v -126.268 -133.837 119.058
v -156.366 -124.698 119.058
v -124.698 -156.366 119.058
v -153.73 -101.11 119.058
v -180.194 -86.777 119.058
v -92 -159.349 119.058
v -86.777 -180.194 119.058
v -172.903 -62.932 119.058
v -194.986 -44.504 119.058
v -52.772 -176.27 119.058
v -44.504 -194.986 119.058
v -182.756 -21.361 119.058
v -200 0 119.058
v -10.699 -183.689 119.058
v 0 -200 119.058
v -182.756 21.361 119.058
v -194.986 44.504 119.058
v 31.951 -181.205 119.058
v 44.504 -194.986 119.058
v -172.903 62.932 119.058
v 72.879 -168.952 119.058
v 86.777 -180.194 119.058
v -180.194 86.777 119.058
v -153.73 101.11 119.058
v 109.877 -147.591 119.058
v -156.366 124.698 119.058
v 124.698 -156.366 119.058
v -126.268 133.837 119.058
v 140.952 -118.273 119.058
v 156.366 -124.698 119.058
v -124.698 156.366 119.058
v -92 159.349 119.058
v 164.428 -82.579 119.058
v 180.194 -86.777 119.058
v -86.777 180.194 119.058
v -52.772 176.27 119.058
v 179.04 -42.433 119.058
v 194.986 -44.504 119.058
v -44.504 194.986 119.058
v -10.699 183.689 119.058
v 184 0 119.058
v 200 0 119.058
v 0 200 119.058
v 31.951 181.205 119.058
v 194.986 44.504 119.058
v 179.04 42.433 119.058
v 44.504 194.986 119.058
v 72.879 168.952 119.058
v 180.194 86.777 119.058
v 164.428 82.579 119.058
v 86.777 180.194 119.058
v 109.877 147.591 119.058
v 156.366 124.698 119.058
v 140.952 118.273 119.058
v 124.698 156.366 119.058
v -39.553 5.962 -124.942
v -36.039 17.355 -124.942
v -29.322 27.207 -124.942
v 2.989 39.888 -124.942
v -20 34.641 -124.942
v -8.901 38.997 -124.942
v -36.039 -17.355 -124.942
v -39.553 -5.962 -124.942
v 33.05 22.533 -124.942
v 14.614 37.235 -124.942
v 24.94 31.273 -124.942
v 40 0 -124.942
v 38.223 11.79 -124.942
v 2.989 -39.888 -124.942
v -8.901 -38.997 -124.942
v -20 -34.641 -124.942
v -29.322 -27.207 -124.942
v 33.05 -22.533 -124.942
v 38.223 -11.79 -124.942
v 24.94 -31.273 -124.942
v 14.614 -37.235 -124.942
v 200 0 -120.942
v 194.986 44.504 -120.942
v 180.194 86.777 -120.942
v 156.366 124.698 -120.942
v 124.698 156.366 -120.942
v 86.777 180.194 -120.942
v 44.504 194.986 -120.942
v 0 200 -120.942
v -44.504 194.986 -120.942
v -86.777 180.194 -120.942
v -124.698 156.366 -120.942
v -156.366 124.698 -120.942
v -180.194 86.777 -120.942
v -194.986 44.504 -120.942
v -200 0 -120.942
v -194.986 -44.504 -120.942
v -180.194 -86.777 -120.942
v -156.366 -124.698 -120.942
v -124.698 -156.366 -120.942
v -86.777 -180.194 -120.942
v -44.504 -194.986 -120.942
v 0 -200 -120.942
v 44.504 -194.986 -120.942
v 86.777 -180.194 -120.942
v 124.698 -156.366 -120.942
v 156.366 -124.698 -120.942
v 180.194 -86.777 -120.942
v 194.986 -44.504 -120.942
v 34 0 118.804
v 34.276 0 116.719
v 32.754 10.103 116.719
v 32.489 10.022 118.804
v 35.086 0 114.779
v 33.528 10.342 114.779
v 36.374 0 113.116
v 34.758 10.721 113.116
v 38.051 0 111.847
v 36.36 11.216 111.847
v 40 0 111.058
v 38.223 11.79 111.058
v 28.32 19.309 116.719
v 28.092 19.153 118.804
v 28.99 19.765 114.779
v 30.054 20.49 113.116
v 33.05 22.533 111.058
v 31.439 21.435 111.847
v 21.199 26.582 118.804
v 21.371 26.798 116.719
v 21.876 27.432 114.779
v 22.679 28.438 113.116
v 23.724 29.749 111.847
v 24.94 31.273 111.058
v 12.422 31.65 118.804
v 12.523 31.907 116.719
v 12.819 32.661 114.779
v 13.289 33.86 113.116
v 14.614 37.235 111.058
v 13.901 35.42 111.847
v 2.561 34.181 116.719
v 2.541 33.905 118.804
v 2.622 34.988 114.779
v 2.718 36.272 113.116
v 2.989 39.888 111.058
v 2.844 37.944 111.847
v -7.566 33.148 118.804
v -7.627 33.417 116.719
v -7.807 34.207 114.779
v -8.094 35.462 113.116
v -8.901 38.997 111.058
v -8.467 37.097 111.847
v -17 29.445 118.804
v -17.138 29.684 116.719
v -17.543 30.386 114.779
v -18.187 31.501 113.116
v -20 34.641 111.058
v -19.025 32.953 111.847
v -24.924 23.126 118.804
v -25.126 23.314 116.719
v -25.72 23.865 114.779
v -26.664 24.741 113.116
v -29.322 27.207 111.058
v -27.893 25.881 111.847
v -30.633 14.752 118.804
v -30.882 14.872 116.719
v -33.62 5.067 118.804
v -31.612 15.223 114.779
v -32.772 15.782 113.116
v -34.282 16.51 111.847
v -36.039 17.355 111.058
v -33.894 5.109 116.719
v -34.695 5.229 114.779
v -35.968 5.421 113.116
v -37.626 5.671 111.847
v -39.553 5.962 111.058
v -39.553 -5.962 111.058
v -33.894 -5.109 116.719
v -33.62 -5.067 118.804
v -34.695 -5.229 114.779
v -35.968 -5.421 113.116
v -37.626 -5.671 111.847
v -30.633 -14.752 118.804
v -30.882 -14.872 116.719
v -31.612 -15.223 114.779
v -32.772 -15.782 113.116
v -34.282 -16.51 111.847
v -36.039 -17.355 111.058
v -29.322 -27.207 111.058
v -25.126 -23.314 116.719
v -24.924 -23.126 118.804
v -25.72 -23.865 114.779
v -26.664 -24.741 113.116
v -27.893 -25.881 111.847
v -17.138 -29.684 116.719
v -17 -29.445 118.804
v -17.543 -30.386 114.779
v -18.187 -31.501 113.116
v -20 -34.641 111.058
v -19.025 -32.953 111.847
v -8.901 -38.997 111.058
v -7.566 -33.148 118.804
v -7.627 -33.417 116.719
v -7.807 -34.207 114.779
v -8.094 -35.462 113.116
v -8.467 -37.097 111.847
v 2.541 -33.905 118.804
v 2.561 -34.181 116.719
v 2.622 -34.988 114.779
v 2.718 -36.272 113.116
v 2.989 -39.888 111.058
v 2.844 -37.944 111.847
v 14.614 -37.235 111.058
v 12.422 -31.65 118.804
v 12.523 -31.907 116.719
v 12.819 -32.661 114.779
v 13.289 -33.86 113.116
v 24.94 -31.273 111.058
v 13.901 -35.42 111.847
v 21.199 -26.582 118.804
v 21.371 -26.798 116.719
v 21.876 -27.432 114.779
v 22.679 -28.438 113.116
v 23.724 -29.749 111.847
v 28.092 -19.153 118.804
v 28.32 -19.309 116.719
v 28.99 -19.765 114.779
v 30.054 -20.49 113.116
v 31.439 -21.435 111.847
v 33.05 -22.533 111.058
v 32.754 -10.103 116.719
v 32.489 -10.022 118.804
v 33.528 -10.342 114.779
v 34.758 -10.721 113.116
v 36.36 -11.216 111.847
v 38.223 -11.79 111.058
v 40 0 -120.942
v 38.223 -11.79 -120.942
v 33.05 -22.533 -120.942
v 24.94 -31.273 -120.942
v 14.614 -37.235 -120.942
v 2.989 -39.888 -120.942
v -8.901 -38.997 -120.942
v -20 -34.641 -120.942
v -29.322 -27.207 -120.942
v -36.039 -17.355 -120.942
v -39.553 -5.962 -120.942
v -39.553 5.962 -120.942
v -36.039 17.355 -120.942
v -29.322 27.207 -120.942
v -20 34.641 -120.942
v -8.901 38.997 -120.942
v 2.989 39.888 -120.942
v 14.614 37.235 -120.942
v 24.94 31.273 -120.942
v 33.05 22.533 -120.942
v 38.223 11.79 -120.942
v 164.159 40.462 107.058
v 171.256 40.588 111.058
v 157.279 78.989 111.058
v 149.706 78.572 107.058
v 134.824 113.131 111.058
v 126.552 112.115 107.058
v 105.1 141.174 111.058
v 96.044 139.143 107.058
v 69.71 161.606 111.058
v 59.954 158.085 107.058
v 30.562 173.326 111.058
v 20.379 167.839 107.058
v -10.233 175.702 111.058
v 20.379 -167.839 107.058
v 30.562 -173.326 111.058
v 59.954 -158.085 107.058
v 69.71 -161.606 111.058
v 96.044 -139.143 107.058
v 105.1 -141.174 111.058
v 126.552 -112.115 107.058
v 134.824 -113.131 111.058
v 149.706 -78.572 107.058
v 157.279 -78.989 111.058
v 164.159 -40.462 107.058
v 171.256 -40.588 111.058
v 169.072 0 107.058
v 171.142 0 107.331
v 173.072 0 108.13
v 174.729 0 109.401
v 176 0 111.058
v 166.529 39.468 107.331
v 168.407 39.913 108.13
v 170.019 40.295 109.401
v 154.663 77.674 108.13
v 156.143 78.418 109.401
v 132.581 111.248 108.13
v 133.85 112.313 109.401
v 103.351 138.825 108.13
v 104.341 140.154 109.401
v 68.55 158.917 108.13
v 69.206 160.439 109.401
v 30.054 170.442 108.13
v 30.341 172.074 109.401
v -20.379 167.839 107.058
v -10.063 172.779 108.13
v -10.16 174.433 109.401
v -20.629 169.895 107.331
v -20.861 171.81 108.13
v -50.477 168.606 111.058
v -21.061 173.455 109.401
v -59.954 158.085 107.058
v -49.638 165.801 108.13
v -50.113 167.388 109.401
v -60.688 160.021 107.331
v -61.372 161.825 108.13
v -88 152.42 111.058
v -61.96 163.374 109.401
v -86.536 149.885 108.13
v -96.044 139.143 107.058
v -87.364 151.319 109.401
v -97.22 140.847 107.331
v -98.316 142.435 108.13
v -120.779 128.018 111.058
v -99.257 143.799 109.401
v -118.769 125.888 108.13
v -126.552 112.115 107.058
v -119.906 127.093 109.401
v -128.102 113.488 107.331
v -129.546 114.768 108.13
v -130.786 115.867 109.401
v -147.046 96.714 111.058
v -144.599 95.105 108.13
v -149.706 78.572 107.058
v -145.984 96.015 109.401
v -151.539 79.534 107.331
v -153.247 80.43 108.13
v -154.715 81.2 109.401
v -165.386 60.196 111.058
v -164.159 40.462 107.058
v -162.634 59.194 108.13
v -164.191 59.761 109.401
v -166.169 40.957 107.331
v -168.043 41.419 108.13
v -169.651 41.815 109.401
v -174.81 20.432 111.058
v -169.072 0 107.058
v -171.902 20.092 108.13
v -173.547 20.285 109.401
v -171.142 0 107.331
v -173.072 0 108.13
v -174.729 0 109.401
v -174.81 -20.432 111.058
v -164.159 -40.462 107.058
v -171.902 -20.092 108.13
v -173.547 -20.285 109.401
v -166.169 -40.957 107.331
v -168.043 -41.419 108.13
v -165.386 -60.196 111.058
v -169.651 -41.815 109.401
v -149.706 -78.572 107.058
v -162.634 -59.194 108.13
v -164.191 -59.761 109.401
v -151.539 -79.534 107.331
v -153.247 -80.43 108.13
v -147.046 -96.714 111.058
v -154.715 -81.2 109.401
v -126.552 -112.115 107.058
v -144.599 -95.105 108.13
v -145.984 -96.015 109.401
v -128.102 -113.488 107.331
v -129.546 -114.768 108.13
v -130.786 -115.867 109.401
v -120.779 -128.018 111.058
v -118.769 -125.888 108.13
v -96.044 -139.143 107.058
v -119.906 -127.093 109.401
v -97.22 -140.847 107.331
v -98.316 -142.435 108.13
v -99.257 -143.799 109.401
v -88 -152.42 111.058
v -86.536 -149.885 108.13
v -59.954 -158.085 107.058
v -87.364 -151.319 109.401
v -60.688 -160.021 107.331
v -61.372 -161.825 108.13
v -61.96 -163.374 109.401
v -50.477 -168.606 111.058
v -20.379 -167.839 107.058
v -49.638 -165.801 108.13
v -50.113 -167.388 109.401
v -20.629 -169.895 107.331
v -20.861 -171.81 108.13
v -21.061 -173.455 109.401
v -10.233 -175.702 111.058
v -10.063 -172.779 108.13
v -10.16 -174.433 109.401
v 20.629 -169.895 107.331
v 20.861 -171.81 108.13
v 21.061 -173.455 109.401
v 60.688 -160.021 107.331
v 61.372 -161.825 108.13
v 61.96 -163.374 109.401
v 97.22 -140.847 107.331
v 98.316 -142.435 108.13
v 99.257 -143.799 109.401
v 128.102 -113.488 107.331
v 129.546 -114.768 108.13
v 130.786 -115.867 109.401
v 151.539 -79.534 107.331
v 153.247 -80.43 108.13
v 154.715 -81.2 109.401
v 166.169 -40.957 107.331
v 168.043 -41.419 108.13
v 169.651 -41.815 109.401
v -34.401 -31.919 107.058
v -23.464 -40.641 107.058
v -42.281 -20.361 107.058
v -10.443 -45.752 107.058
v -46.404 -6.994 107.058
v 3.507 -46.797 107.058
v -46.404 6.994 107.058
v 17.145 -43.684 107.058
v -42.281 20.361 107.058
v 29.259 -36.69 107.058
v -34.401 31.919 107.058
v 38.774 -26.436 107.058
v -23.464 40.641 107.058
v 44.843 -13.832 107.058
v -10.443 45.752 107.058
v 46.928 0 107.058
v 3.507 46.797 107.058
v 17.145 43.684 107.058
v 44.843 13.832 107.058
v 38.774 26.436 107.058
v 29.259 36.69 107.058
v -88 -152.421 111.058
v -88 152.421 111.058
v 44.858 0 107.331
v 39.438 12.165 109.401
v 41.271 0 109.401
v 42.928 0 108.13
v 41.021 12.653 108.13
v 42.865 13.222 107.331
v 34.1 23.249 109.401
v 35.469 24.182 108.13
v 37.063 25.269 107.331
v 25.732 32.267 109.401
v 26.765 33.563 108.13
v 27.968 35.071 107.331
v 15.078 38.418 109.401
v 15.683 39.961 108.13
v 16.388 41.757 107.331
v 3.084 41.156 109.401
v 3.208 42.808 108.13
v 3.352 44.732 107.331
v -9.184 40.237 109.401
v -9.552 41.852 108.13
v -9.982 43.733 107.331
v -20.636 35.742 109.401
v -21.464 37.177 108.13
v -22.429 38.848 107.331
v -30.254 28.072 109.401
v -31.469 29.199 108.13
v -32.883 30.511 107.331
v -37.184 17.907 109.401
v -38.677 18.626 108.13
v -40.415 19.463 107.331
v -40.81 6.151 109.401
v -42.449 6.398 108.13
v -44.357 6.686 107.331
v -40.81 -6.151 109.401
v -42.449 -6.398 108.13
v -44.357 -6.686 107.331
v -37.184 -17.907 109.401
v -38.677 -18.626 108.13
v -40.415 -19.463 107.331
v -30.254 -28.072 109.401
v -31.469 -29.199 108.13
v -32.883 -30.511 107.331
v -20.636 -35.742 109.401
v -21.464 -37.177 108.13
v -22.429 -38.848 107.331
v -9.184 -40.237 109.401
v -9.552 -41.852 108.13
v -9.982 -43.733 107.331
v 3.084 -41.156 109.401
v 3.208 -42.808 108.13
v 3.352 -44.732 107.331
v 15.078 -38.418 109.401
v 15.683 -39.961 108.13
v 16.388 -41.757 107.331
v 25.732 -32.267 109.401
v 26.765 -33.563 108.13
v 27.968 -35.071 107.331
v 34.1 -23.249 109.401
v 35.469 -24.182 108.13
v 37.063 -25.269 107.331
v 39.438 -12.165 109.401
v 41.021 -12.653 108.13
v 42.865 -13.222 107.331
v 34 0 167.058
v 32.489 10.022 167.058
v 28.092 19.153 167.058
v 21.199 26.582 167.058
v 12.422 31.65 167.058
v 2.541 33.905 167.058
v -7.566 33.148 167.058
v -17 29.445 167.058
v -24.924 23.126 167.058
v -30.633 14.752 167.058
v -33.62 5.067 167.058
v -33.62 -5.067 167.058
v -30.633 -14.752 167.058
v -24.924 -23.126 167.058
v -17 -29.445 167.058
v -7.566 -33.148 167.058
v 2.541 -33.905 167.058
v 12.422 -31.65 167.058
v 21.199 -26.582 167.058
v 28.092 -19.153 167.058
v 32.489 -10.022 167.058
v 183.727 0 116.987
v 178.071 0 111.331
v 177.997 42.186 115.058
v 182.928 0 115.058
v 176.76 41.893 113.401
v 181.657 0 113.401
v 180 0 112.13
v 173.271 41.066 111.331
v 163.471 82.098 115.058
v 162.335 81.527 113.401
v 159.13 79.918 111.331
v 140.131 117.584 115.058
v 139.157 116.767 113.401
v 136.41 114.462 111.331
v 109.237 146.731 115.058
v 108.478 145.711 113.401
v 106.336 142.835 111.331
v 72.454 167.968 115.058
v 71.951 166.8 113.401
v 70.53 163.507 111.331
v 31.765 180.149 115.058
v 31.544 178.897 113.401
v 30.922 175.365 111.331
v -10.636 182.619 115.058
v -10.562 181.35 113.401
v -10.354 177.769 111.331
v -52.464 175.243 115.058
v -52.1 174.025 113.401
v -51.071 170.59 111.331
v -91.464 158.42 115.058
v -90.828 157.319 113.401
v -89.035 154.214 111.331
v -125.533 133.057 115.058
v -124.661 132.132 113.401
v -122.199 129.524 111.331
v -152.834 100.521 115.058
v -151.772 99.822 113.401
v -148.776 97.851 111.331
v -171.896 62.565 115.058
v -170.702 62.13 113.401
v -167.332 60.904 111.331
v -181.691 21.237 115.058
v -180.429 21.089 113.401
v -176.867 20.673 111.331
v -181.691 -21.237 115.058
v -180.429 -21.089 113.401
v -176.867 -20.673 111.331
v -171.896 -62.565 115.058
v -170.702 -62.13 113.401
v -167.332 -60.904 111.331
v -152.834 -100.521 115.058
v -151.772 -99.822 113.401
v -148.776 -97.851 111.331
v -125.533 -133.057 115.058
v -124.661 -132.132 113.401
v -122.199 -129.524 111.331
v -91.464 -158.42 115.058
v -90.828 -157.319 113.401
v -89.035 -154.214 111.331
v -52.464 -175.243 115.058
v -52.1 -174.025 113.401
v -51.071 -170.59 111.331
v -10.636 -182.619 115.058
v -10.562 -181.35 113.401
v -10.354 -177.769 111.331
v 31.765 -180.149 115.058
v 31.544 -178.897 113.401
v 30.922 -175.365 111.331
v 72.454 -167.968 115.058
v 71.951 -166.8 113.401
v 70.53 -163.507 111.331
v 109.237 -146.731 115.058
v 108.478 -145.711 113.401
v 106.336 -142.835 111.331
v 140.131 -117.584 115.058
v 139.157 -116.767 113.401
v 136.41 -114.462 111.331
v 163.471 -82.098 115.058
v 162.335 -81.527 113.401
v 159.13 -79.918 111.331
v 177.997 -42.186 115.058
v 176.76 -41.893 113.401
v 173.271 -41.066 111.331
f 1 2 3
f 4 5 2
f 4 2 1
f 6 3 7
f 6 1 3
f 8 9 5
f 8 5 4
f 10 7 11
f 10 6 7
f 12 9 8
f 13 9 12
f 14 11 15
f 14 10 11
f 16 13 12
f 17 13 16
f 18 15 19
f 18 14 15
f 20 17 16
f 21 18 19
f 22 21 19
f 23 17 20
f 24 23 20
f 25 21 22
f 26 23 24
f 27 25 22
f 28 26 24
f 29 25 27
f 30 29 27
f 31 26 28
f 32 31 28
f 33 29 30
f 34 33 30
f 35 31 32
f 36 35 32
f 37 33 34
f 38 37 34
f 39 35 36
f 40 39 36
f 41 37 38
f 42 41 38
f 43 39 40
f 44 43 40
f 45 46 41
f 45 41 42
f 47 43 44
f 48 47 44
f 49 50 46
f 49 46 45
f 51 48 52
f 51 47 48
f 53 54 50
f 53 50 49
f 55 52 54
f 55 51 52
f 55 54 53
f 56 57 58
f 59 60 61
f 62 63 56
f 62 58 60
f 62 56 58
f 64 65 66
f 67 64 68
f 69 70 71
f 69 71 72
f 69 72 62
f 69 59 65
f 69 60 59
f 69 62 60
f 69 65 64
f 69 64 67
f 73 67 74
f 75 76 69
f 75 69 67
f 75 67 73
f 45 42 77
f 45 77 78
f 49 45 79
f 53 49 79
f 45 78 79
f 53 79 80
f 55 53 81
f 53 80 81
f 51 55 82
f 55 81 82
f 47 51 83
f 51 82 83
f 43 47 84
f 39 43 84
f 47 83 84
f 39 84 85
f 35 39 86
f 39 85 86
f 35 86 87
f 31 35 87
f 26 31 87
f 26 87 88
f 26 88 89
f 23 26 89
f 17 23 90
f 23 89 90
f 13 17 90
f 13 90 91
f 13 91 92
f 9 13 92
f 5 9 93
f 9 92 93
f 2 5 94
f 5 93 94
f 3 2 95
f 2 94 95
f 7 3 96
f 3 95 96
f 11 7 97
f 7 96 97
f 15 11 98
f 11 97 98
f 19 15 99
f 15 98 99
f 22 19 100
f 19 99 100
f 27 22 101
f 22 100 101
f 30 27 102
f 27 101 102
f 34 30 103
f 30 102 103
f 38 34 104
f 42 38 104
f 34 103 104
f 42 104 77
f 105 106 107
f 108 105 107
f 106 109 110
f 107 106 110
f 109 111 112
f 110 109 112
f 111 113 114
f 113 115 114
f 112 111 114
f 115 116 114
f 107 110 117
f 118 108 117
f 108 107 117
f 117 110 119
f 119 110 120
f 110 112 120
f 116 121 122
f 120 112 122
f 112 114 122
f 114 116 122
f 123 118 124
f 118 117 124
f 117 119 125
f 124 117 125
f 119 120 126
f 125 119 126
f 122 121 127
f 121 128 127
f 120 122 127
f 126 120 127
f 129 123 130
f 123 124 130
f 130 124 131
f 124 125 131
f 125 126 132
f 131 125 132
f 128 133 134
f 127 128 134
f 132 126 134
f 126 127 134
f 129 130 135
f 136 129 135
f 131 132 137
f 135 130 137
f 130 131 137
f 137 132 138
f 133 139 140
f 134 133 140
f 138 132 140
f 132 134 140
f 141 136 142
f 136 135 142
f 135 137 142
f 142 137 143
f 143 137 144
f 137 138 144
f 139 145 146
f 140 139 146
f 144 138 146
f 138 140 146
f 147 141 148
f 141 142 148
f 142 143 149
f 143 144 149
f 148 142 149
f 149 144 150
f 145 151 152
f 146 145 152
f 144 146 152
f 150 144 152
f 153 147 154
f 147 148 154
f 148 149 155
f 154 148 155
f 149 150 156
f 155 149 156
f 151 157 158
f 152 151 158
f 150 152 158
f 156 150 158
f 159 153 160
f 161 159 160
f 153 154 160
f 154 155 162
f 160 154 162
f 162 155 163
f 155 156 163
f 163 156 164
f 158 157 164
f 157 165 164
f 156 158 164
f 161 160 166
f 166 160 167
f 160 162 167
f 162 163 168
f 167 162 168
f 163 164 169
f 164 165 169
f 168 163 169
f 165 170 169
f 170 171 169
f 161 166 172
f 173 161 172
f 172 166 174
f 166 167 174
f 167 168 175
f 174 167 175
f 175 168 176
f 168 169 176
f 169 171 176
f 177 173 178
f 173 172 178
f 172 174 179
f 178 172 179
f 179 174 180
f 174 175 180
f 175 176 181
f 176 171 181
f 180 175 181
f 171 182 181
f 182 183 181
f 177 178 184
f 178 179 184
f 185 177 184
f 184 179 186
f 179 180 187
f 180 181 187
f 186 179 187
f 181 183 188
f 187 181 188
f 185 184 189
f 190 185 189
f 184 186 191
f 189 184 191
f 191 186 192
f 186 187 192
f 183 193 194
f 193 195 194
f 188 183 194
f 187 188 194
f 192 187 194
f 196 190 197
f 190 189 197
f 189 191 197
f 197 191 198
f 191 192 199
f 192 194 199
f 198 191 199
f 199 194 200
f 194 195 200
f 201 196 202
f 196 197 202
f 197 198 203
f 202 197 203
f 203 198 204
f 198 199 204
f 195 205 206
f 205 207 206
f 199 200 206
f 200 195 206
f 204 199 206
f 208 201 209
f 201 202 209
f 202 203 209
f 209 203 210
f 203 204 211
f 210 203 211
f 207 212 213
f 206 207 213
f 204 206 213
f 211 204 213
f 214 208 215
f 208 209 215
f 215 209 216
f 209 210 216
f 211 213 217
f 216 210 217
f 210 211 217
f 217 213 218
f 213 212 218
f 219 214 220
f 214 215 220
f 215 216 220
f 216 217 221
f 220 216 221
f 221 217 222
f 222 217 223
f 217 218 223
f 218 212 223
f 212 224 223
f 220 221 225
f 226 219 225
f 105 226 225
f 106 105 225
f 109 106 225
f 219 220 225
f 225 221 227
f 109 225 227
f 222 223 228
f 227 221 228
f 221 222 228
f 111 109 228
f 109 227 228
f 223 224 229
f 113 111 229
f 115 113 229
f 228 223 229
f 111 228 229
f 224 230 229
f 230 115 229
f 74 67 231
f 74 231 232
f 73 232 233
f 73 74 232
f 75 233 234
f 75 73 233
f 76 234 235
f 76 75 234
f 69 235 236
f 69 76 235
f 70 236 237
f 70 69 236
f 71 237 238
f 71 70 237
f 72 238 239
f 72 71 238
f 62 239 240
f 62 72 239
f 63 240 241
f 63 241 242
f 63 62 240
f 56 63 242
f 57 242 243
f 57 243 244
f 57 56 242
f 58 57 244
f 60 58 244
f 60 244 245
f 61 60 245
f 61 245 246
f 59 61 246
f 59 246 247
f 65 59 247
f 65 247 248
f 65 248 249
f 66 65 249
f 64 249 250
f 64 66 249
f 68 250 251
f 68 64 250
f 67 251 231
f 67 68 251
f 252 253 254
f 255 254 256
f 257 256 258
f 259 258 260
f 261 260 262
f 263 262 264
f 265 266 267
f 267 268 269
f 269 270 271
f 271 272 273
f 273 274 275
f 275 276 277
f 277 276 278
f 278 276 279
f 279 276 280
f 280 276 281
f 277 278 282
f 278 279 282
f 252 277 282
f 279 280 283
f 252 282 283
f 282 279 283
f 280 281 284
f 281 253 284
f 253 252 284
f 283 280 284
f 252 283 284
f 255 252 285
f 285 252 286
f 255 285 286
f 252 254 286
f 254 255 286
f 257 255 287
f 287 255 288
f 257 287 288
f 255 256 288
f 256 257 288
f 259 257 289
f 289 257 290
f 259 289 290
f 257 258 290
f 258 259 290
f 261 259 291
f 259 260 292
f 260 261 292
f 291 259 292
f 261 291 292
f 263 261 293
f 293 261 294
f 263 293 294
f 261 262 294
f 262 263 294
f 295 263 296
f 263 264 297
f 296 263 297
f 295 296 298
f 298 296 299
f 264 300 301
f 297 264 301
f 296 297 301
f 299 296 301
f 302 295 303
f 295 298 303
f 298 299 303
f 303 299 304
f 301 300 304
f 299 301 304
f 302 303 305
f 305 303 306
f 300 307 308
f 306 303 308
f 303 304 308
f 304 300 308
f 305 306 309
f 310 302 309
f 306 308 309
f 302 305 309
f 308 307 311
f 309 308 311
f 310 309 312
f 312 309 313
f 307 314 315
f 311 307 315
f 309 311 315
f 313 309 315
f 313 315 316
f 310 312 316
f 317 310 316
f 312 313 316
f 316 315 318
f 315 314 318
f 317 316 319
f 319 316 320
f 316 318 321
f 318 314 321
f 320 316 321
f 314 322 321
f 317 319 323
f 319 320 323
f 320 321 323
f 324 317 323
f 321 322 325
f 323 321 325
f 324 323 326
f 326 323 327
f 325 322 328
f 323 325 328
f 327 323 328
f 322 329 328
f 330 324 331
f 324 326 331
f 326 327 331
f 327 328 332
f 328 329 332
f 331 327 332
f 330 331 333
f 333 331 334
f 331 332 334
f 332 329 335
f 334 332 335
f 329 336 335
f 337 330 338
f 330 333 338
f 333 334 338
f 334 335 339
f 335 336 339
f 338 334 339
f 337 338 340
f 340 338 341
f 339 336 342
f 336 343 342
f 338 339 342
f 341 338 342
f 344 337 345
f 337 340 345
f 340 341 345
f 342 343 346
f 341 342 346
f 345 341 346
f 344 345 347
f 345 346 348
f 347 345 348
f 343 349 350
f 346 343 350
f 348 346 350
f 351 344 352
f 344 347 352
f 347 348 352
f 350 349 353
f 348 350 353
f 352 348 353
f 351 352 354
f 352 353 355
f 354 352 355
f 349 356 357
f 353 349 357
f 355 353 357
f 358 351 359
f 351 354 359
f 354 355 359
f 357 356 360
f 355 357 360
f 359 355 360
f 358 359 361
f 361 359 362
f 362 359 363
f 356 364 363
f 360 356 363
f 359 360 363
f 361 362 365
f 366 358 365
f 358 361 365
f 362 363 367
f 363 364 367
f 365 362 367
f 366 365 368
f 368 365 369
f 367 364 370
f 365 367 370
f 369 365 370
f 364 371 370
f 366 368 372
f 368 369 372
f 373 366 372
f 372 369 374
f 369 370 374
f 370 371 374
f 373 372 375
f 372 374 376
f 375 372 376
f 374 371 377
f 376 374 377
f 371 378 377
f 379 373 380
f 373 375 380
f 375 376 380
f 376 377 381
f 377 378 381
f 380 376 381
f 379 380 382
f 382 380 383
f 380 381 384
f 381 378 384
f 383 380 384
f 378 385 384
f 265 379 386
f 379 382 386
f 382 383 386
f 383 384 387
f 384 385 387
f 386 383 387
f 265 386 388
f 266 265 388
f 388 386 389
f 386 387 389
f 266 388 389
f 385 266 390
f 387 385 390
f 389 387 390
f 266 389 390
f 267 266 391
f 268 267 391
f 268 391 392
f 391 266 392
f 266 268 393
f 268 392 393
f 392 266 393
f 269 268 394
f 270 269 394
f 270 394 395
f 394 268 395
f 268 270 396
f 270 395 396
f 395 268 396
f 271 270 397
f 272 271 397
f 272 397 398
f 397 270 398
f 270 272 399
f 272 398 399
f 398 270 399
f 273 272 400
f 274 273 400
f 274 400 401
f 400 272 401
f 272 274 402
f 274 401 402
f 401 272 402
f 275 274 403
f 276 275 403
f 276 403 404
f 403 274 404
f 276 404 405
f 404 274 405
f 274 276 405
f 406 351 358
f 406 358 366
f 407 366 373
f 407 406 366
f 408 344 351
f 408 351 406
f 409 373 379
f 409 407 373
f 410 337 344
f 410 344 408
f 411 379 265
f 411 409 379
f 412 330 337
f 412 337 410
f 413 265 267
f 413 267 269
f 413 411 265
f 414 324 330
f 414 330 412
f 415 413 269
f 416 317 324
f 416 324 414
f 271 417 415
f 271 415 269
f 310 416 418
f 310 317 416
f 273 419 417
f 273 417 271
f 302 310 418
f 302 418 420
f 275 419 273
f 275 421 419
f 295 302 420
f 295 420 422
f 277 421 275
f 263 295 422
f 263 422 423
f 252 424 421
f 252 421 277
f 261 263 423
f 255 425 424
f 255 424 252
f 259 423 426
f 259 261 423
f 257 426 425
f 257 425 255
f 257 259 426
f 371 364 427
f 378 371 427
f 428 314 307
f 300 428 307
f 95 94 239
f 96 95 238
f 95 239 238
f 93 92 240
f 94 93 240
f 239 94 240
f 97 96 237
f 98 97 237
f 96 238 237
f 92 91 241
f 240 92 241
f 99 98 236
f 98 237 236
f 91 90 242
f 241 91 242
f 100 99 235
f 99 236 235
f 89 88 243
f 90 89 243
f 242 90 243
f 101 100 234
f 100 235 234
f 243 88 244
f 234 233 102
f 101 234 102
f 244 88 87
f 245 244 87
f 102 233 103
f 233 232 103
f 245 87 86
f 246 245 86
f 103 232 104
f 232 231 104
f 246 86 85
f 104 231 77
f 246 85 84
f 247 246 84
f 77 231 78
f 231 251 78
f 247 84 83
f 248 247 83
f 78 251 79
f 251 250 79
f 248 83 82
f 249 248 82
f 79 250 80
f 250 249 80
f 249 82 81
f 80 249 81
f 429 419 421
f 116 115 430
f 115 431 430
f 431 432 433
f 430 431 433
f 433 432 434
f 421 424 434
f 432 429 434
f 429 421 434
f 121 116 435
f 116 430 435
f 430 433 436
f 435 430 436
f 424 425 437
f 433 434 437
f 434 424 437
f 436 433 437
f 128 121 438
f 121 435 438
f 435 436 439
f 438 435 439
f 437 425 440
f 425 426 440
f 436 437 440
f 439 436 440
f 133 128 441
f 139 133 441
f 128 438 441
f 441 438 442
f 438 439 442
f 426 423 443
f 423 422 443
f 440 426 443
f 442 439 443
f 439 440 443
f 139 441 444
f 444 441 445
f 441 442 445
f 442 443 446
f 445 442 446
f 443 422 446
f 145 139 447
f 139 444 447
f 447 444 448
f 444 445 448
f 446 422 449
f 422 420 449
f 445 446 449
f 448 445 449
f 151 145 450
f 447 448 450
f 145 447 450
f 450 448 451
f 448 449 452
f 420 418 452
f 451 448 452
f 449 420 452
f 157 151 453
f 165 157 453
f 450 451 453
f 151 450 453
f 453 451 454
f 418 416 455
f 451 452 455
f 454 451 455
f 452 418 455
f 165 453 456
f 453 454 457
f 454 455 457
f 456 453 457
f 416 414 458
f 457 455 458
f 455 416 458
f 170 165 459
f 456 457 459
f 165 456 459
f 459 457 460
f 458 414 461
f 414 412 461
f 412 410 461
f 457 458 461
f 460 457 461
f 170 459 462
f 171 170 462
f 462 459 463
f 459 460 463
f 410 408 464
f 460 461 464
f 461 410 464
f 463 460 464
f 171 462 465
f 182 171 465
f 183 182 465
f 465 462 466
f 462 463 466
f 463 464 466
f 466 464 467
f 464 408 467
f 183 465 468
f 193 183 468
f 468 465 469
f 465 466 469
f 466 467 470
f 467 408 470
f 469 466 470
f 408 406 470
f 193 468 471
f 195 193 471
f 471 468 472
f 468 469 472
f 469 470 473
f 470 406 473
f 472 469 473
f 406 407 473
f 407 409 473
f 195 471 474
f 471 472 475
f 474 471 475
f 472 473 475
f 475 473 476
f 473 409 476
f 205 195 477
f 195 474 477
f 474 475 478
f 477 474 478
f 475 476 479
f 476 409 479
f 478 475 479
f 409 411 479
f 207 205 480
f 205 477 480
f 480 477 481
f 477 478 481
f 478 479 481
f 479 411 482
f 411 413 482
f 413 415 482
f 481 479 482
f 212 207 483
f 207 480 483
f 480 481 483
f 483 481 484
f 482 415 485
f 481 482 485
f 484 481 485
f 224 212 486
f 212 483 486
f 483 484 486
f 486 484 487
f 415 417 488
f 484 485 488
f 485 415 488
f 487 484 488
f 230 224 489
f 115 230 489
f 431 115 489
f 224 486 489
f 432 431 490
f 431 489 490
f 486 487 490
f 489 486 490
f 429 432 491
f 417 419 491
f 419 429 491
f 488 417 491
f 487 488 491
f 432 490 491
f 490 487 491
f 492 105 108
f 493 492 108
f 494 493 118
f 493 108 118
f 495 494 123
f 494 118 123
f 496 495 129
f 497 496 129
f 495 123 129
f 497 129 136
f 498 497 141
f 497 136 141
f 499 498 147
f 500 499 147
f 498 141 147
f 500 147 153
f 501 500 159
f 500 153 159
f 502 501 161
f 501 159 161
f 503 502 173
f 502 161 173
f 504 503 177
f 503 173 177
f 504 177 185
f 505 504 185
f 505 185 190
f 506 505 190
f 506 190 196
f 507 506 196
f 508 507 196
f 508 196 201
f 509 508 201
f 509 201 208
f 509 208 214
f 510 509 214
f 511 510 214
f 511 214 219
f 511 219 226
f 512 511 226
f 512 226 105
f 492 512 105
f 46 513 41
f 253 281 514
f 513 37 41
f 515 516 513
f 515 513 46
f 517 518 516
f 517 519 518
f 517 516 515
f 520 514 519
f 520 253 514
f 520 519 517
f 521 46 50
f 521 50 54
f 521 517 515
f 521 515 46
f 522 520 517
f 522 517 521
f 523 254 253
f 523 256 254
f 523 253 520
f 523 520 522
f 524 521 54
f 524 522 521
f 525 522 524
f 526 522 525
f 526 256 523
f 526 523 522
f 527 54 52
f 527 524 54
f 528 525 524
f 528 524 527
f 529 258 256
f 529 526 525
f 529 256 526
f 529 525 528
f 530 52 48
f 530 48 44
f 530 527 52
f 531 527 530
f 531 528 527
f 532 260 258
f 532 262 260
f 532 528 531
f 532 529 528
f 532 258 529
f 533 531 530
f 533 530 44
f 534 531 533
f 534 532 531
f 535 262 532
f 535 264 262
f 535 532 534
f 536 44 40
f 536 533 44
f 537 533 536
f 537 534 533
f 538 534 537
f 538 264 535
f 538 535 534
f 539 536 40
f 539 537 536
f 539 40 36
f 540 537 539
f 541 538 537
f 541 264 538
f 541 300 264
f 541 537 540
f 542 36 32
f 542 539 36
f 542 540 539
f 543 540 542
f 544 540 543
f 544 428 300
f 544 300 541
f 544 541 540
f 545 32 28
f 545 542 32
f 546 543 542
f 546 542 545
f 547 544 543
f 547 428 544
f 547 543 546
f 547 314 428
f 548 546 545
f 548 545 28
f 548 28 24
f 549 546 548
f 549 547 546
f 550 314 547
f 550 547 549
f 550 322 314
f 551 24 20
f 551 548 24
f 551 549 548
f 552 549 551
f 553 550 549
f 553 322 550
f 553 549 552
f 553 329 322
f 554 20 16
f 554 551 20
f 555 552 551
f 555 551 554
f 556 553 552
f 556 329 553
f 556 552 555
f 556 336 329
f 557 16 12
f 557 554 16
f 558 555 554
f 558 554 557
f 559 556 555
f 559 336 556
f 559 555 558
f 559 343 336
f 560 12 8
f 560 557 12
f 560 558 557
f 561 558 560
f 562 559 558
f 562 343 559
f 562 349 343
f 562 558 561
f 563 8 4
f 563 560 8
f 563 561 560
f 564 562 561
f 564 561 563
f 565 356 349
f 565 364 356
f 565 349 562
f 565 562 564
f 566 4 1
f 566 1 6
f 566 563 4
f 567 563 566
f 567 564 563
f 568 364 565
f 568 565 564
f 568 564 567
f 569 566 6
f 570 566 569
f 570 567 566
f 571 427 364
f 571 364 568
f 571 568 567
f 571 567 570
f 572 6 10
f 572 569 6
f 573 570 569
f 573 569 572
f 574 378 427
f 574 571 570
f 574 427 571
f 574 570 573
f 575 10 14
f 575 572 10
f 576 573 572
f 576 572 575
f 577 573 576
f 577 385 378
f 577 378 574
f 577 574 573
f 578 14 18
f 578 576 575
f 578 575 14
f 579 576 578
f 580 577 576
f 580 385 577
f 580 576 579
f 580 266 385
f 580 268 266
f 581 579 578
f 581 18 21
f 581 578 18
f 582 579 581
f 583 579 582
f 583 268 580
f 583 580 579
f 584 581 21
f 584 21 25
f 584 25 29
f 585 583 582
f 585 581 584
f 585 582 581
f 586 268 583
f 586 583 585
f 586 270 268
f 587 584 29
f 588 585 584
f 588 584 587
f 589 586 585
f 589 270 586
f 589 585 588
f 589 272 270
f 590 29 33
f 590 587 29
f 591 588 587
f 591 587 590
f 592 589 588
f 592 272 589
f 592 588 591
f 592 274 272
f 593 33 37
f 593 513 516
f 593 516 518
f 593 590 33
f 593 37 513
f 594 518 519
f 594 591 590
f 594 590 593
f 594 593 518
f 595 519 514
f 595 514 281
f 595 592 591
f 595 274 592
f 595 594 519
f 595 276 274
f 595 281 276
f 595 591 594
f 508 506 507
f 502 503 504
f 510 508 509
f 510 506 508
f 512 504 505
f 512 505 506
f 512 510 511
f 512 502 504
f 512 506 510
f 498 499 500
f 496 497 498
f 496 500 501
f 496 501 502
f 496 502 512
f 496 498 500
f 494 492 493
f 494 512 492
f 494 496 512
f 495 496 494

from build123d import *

# Parameters (mm, degrees)
BOSS_EXTRUDE1_DEPTH      = 150
BOSS_EXTRUDE1_DEPTH_BACK = 150
SKETCH1_R                = 250
SKETCH2_R                = 230
CUT_EXTRUDE2_DEPTH       = 10
SKETCH3_R                = 220
CUT_EXTRUDE3_DEPTH       = 5
FILLET1_R                = 10
FILLET2_R                = 10
SKETCH4_R                = 50
BOSS_EXTRUDE2_DEPTH      = 5
SKETCH5_R                = 42.5
BOSS_EXTRUDE3_DEPTH      = 70
BOSS_EXTRUDE4_START      = 5
SKETCH6_R                = 50
BOSS_EXTRUDE4_DEPTH      = 5
FILLET3_R                = 10
SCALE1_SCALE             = 0.8


# Some blends are built 0.0001 mm under size
with BuildPart() as part:
    # Sketch1 → Boss-Extrude1 (new, two sides: drawn at the far end of the back side and taken through both)
    with BuildSketch(Plane.XY.offset(-BOSS_EXTRUDE1_DEPTH_BACK)):
        Circle(SKETCH1_R)
    extrude(amount=BOSS_EXTRUDE1_DEPTH + BOSS_EXTRUDE1_DEPTH_BACK)

    # Sketch2 → Cut-Extrude2 (cut)
    with BuildSketch(Plane.XY.offset(150)):
        Circle(SKETCH2_R)
    extrude(amount=-CUT_EXTRUDE2_DEPTH, mode=Mode.SUBTRACT)

    # Sketch3 → Cut-Extrude3 (cut)
    with BuildSketch(Plane.XY.offset(140)):
        Circle(SKETCH3_R)
    extrude(amount=-CUT_EXTRUDE3_DEPTH, mode=Mode.SUBTRACT)

    # Fillet1
    fillet1_edges = [part.edges().sort_by_distance(p)[0] for p in [
        (-230, 0, 140),
    ]]
    fillet(fillet1_edges, radius=FILLET1_R - 0.0001)  # a hair under: the kernel refuses the full size

    # Fillet2
    # the kernel refuses this fillet: 10 mm, written as the material it adds along each edge
    with BuildSketch(Plane(origin=(0, 0, 135), x_dir=(1, 0, 0), z_dir=(0, -1, 0))) as fillet2_piece_1:
        with BuildLine():
            CenterArc((211.339745962, 10), FILLET2_R, 270, 60)
            Line((211.339745962, 0), (211.339745962, -0.2))
            Line((211.339745962, -0.2), (220, -0.2))
            Line((220, -0.2), (220.2, 0))
            ThreePointArc((220.2, 0), (220.2, 2.5), (220.173205081, 4.9))
            Line((220.173205081, 4.9), (220, 5))
        make_face()
    revolve(axis=Axis((0, 0, 135), (0, 0, 1)))

    # Sketch4 → Boss-Extrude2 (add)
    with BuildSketch(Plane.XY.offset(135)):
        Circle(SKETCH4_R)
    extrude(amount=BOSS_EXTRUDE2_DEPTH)

    # Sketch5 → Boss-Extrude3 (add)
    with BuildSketch(Plane.XY.offset(140)):
        Circle(SKETCH5_R)
    extrude(amount=BOSS_EXTRUDE3_DEPTH)

    # Sketch6 → Boss-Extrude4 (add)
    with BuildSketch(Plane(origin=(0, 0, -150), x_dir=(-1, 0, 0), z_dir=(0, 0, -1)).offset(BOSS_EXTRUDE4_START)):
        with Locations(Location((0, 0, 0), (0, 0, 180))):
            Circle(SKETCH6_R)
    extrude(amount=-BOSS_EXTRUDE4_DEPTH)

    # Fillet3
    # the kernel refuses this fillet: 10 mm, written as the material it adds along each edge
    with BuildSketch(Plane(origin=(0, 0, 135), x_dir=(1, 0, 0), z_dir=(0, -1, 0))) as fillet3_piece_1:
        with BuildLine():
            CenterArc((58.660254038, 10), FILLET3_R, 210, 60)
            Line((50, 5), (49.826794919, 4.9))
            ThreePointArc((49.826794919, 4.9), (49.8, 2.5), (49.8, 0))
            Line((49.8, 0), (50, -0.2))
            Line((50, -0.2), (58.660254038, -0.2))
            Line((58.660254038, -0.2), (58.660254038, 0))
        make_face()
    revolve(axis=Axis((0, 0, 135), (0, 0, 1)))
    with BuildSketch(Plane(origin=(0, 0, 140), x_dir=(1, 0, 0), z_dir=(0, -1, 0))) as fillet3_piece_2:
        with BuildLine():
            CenterArc((52.5, 9.682458366), FILLET3_R, 180, 75.522487814)
            Line((42.5, 9.682458366), (42.3, 9.682458366))
            Line((42.3, 9.682458366), (42.3, 0))
            Line((42.3, 0), (42.5, -0.2))
            ThreePointArc((42.5, -0.2), (46.25, -0.2), (49.95, -0.193649167))
            Line((49.95, -0.193649167), (50, 0))
        make_face()
    revolve(axis=Axis((0, 0, 140), (0, 0, 1)))


with BuildPart() as part_1:
    # Scale1: scaled about (0, 0, -4.710262046)
    add(part.part.scale(SCALE1_SCALE).moved(Location((0, 0, -0.942052409))))


solid = part_1.part
